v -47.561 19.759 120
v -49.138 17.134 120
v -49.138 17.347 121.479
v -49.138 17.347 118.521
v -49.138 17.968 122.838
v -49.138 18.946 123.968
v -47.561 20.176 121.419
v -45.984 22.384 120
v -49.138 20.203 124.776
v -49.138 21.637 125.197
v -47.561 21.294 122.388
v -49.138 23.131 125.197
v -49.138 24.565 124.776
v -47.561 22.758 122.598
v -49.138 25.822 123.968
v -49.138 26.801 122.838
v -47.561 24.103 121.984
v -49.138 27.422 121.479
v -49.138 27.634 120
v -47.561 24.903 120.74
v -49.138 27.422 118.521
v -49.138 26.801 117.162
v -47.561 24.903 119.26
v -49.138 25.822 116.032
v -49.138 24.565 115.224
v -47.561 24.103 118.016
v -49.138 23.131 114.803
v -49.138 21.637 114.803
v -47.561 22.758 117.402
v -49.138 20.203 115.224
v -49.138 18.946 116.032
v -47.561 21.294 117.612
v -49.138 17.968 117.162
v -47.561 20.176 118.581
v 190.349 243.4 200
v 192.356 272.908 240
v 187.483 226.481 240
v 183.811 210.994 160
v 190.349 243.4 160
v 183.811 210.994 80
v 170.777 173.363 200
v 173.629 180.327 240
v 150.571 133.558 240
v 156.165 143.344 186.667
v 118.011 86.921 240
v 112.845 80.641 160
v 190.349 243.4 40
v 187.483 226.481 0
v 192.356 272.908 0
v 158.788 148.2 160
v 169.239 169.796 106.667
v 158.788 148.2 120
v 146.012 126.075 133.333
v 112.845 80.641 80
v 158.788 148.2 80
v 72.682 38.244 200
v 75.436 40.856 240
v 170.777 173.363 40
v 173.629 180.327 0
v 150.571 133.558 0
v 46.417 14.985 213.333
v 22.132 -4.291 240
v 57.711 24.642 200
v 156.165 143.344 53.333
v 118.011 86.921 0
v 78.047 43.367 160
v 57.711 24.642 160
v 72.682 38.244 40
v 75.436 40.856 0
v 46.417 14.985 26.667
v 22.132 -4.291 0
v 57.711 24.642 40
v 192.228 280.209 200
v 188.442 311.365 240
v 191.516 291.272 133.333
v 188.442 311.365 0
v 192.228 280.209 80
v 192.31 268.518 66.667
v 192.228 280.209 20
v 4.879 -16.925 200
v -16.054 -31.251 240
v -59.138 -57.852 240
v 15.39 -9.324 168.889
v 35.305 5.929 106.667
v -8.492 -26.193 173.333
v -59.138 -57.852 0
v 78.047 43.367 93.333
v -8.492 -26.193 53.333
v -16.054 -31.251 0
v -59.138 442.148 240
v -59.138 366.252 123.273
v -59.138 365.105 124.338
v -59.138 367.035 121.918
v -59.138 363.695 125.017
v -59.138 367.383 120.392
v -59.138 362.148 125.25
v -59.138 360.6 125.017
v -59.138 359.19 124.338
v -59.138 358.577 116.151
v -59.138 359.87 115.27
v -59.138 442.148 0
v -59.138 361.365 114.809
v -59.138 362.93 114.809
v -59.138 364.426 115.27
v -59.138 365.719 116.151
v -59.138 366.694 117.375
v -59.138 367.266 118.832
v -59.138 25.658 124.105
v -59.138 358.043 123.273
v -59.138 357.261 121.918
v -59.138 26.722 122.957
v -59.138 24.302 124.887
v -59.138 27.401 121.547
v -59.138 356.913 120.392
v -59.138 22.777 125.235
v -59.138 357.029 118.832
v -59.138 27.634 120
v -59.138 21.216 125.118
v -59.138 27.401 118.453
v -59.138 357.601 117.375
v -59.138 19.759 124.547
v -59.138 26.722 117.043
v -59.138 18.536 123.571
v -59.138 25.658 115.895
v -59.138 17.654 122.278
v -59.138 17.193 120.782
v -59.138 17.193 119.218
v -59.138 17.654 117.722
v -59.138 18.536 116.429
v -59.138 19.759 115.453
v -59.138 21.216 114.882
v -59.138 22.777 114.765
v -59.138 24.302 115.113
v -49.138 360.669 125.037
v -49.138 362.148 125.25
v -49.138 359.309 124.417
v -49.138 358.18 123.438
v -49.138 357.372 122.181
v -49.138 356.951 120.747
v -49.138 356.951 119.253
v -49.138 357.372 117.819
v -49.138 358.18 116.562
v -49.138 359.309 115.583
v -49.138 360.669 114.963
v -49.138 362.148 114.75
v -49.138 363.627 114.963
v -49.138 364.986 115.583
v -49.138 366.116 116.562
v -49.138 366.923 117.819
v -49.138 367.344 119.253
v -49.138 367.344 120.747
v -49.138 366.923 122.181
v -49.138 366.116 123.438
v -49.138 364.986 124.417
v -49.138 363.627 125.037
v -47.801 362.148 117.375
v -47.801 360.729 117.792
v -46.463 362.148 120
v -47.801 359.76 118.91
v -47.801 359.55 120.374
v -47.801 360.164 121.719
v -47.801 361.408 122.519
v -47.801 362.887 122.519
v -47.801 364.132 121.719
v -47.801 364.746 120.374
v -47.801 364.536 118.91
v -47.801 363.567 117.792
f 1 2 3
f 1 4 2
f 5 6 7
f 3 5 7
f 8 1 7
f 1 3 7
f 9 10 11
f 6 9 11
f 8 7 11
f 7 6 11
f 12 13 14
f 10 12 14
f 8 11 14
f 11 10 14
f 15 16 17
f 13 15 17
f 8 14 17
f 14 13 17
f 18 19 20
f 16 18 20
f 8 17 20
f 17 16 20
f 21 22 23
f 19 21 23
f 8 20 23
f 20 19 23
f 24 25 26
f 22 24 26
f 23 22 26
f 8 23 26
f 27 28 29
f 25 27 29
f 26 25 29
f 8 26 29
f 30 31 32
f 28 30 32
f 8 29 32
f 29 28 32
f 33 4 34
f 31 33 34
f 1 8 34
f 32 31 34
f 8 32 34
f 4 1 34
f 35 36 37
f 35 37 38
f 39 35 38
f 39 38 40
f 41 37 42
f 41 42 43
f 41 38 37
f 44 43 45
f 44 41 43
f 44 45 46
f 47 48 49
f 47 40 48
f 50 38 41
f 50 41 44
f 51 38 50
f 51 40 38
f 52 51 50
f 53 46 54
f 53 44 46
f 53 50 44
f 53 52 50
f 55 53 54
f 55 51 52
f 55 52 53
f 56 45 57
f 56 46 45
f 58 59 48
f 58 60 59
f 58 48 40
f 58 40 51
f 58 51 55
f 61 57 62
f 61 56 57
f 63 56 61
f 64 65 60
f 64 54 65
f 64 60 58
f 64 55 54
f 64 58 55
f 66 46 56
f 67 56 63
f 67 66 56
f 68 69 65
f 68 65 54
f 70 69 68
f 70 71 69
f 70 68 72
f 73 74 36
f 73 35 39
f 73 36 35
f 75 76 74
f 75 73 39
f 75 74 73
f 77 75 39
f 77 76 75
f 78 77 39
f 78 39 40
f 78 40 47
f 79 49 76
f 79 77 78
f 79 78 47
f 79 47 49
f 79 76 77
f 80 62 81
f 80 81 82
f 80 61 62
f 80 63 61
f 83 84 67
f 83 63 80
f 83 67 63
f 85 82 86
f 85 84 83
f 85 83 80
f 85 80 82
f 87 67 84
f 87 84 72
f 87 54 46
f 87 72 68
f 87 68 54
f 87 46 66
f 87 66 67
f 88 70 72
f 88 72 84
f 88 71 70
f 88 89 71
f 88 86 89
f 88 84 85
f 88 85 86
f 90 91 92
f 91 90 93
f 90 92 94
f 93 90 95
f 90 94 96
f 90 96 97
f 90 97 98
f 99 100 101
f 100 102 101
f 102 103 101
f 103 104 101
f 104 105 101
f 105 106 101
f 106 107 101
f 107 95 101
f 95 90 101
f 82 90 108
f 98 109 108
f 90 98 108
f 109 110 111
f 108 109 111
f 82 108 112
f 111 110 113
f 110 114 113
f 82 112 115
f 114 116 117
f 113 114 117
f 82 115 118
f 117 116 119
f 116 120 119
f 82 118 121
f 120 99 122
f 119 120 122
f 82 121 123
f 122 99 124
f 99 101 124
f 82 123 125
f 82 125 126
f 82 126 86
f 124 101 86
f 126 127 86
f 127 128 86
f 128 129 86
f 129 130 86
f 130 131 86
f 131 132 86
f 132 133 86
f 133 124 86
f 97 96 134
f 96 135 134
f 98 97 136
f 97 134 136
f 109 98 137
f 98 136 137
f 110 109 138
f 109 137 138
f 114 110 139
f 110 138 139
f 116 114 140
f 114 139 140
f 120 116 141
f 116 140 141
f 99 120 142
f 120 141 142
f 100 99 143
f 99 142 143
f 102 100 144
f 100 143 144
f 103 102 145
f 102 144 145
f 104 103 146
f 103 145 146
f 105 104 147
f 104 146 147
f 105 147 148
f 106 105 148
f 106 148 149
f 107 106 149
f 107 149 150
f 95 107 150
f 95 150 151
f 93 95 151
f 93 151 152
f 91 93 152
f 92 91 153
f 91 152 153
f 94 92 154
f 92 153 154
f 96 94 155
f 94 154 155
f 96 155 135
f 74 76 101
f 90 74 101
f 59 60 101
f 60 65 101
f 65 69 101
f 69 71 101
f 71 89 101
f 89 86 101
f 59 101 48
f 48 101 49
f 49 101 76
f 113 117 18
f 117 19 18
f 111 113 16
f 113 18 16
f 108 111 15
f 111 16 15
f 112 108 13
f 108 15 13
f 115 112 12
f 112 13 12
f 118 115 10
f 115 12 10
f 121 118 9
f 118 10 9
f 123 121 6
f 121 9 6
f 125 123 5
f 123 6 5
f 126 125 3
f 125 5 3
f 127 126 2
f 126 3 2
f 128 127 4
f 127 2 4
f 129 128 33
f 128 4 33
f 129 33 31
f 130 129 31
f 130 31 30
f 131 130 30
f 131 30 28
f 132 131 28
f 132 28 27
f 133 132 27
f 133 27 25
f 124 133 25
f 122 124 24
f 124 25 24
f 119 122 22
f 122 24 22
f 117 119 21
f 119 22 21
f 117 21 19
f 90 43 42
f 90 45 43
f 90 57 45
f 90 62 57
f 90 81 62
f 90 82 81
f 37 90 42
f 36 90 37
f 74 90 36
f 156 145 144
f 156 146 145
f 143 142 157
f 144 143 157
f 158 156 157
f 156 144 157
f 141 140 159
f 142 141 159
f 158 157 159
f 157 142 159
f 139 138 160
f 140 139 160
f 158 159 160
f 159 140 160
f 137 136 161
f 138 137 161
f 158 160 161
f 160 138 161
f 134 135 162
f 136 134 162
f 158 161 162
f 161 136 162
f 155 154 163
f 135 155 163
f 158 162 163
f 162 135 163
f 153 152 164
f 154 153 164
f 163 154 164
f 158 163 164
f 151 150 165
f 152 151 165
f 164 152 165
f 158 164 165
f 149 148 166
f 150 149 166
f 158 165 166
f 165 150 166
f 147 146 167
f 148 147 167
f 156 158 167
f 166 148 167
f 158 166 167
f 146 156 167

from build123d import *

# Parameters (mm, degrees)
Y_KSEKLIK_EKSTR_ZYON2_DEPTH   = 240
Y_KSEKLIK_EKSTR_ZYON2_2_DEPTH = 240
G_VDE_TA_KOPYALA2_ANGLE       = 7
G_VDE_TA_KOPYALA3_ANGLE       = 4
UST_DELIK_D                   = 10.5
UST_DELIK_DEPTH               = 10
UST_DELIK_TIP                 = 2.67500861
ALT_DELIK_D                   = 10.5
ALT_DELIK_DEPTH               = 10
ALT_DELIK_TIP                 = 3.15451825


with BuildPart() as part:
    # Çizim1 → Yükseklik-Ekstrüzyon2 (new body)
    with BuildSketch(Plane(origin=(-22.055999745, 28.001617244, 0), x_dir=(1, 0, 0), z_dir=(0, 0, 1))):
        with BuildLine():
            Line((-37.082072605, 414.146244925), (-37.082072605, -85.853755075))
            add(Edge.make_bspline(
                [(210.498072668, 283.363709139), (227.474964457, 205.264694355), (196.969150445, 49.42864807), (-37.082072605, -85.853755075)],
                knots=[0, 0, 0, 0, 1, 1, 1, 1], degree=3))
            Line((210.498072668, 283.363709139), (-37.082072605, 414.146244925))
        make_face()
    extrude(amount=Y_KSEKLIK_EKSTR_ZYON2_DEPTH)

    # ust delik
    with Locations(Plane(origin=(-59.13807235, 362.147862169, 120), x_dir=(0, 0, -1), z_dir=(-1, 0, 0))):
        with Locations((0, 0)):
            Hole(UST_DELIK_D / 2, depth=UST_DELIK_DEPTH)
            with Locations((0, 0, -(UST_DELIK_DEPTH + UST_DELIK_TIP / 2))):  # 126° drill point
                Cone(0, UST_DELIK_D / 2, UST_DELIK_TIP, mode=Mode.SUBTRACT)

    # alt delik
    with Locations(Plane(origin=(-59.13807235, 22.384202905, 120), x_dir=(0, -1, 0), z_dir=(-1, 0, 0))):
        with Locations((0, 0)):
            Hole(ALT_DELIK_D / 2, depth=ALT_DELIK_DEPTH)
            with Locations((0, 0, -(ALT_DELIK_DEPTH + ALT_DELIK_TIP / 2))):  # 118° drill point
                Cone(0, ALT_DELIK_D / 2, ALT_DELIK_TIP, mode=Mode.SUBTRACT)


with BuildPart() as body_2:
    # Çizim1 → Y_kseklik-Ekstr_zyon2 2 (new body)
    with BuildSketch(Plane(origin=(-22.055999745, 28.001617244, 0), x_dir=(1, 0, 0), z_dir=(0, 0, 1))):
        with BuildLine():
            Line((15.715679649, 483.77831526), (256.375268542, 340.659615315))
            add(Edge.make_bspline(
                [(15.715679649, 483.77831526), (225.582543856, 567.943211332), (256.375268542, 340.659615315)],
                knots=[0, 0, 0, 1, 1, 1], degree=2))
        make_face()
    extrude(amount=Y_KSEKLIK_EKSTR_ZYON2_2_DEPTH)


with BuildPart() as body_2_1:
    # Gövde-Taşı/Kopyala1: moved
    add(body_2.part.moved(Location((-44.412942898, -54.698045463, 0))))


with BuildPart() as body_2_2:
    # Gövde-Taşı/Kopyala2: moved
    add(body_2_1.part.rotate(Axis((69.576531453, 406.563761086, 0), (0, 0, 1)), G_VDE_TA_KOPYALA2_ANGLE))


with BuildPart() as body_2_3:
    # Gövde-Taşı/Kopyala3: moved
    add(body_2_2.part.rotate(Axis((72.140811609, 412.957845322, 0), (0, 0, -1)), G_VDE_TA_KOPYALA3_ANGLE))


with BuildPart() as body_2_4:
    # Gövde-Taşı/Kopyala4: moved
    add(body_2_3.part.moved(Location((0, -9.817597904, 0))))


with BuildPart() as body_2_5:
    # Gövde-Taşı/Kopyala5: moved
    add(body_2_4.part.moved(Location((-8.88258858, 0, 0))))


with BuildPart() as body_2_6:
    # Gövde-Taşı/Kopyala6: moved
    add(body_2_5.part.moved(Location((3.740037297, 1.870018648, 0))))


solid = part.part
